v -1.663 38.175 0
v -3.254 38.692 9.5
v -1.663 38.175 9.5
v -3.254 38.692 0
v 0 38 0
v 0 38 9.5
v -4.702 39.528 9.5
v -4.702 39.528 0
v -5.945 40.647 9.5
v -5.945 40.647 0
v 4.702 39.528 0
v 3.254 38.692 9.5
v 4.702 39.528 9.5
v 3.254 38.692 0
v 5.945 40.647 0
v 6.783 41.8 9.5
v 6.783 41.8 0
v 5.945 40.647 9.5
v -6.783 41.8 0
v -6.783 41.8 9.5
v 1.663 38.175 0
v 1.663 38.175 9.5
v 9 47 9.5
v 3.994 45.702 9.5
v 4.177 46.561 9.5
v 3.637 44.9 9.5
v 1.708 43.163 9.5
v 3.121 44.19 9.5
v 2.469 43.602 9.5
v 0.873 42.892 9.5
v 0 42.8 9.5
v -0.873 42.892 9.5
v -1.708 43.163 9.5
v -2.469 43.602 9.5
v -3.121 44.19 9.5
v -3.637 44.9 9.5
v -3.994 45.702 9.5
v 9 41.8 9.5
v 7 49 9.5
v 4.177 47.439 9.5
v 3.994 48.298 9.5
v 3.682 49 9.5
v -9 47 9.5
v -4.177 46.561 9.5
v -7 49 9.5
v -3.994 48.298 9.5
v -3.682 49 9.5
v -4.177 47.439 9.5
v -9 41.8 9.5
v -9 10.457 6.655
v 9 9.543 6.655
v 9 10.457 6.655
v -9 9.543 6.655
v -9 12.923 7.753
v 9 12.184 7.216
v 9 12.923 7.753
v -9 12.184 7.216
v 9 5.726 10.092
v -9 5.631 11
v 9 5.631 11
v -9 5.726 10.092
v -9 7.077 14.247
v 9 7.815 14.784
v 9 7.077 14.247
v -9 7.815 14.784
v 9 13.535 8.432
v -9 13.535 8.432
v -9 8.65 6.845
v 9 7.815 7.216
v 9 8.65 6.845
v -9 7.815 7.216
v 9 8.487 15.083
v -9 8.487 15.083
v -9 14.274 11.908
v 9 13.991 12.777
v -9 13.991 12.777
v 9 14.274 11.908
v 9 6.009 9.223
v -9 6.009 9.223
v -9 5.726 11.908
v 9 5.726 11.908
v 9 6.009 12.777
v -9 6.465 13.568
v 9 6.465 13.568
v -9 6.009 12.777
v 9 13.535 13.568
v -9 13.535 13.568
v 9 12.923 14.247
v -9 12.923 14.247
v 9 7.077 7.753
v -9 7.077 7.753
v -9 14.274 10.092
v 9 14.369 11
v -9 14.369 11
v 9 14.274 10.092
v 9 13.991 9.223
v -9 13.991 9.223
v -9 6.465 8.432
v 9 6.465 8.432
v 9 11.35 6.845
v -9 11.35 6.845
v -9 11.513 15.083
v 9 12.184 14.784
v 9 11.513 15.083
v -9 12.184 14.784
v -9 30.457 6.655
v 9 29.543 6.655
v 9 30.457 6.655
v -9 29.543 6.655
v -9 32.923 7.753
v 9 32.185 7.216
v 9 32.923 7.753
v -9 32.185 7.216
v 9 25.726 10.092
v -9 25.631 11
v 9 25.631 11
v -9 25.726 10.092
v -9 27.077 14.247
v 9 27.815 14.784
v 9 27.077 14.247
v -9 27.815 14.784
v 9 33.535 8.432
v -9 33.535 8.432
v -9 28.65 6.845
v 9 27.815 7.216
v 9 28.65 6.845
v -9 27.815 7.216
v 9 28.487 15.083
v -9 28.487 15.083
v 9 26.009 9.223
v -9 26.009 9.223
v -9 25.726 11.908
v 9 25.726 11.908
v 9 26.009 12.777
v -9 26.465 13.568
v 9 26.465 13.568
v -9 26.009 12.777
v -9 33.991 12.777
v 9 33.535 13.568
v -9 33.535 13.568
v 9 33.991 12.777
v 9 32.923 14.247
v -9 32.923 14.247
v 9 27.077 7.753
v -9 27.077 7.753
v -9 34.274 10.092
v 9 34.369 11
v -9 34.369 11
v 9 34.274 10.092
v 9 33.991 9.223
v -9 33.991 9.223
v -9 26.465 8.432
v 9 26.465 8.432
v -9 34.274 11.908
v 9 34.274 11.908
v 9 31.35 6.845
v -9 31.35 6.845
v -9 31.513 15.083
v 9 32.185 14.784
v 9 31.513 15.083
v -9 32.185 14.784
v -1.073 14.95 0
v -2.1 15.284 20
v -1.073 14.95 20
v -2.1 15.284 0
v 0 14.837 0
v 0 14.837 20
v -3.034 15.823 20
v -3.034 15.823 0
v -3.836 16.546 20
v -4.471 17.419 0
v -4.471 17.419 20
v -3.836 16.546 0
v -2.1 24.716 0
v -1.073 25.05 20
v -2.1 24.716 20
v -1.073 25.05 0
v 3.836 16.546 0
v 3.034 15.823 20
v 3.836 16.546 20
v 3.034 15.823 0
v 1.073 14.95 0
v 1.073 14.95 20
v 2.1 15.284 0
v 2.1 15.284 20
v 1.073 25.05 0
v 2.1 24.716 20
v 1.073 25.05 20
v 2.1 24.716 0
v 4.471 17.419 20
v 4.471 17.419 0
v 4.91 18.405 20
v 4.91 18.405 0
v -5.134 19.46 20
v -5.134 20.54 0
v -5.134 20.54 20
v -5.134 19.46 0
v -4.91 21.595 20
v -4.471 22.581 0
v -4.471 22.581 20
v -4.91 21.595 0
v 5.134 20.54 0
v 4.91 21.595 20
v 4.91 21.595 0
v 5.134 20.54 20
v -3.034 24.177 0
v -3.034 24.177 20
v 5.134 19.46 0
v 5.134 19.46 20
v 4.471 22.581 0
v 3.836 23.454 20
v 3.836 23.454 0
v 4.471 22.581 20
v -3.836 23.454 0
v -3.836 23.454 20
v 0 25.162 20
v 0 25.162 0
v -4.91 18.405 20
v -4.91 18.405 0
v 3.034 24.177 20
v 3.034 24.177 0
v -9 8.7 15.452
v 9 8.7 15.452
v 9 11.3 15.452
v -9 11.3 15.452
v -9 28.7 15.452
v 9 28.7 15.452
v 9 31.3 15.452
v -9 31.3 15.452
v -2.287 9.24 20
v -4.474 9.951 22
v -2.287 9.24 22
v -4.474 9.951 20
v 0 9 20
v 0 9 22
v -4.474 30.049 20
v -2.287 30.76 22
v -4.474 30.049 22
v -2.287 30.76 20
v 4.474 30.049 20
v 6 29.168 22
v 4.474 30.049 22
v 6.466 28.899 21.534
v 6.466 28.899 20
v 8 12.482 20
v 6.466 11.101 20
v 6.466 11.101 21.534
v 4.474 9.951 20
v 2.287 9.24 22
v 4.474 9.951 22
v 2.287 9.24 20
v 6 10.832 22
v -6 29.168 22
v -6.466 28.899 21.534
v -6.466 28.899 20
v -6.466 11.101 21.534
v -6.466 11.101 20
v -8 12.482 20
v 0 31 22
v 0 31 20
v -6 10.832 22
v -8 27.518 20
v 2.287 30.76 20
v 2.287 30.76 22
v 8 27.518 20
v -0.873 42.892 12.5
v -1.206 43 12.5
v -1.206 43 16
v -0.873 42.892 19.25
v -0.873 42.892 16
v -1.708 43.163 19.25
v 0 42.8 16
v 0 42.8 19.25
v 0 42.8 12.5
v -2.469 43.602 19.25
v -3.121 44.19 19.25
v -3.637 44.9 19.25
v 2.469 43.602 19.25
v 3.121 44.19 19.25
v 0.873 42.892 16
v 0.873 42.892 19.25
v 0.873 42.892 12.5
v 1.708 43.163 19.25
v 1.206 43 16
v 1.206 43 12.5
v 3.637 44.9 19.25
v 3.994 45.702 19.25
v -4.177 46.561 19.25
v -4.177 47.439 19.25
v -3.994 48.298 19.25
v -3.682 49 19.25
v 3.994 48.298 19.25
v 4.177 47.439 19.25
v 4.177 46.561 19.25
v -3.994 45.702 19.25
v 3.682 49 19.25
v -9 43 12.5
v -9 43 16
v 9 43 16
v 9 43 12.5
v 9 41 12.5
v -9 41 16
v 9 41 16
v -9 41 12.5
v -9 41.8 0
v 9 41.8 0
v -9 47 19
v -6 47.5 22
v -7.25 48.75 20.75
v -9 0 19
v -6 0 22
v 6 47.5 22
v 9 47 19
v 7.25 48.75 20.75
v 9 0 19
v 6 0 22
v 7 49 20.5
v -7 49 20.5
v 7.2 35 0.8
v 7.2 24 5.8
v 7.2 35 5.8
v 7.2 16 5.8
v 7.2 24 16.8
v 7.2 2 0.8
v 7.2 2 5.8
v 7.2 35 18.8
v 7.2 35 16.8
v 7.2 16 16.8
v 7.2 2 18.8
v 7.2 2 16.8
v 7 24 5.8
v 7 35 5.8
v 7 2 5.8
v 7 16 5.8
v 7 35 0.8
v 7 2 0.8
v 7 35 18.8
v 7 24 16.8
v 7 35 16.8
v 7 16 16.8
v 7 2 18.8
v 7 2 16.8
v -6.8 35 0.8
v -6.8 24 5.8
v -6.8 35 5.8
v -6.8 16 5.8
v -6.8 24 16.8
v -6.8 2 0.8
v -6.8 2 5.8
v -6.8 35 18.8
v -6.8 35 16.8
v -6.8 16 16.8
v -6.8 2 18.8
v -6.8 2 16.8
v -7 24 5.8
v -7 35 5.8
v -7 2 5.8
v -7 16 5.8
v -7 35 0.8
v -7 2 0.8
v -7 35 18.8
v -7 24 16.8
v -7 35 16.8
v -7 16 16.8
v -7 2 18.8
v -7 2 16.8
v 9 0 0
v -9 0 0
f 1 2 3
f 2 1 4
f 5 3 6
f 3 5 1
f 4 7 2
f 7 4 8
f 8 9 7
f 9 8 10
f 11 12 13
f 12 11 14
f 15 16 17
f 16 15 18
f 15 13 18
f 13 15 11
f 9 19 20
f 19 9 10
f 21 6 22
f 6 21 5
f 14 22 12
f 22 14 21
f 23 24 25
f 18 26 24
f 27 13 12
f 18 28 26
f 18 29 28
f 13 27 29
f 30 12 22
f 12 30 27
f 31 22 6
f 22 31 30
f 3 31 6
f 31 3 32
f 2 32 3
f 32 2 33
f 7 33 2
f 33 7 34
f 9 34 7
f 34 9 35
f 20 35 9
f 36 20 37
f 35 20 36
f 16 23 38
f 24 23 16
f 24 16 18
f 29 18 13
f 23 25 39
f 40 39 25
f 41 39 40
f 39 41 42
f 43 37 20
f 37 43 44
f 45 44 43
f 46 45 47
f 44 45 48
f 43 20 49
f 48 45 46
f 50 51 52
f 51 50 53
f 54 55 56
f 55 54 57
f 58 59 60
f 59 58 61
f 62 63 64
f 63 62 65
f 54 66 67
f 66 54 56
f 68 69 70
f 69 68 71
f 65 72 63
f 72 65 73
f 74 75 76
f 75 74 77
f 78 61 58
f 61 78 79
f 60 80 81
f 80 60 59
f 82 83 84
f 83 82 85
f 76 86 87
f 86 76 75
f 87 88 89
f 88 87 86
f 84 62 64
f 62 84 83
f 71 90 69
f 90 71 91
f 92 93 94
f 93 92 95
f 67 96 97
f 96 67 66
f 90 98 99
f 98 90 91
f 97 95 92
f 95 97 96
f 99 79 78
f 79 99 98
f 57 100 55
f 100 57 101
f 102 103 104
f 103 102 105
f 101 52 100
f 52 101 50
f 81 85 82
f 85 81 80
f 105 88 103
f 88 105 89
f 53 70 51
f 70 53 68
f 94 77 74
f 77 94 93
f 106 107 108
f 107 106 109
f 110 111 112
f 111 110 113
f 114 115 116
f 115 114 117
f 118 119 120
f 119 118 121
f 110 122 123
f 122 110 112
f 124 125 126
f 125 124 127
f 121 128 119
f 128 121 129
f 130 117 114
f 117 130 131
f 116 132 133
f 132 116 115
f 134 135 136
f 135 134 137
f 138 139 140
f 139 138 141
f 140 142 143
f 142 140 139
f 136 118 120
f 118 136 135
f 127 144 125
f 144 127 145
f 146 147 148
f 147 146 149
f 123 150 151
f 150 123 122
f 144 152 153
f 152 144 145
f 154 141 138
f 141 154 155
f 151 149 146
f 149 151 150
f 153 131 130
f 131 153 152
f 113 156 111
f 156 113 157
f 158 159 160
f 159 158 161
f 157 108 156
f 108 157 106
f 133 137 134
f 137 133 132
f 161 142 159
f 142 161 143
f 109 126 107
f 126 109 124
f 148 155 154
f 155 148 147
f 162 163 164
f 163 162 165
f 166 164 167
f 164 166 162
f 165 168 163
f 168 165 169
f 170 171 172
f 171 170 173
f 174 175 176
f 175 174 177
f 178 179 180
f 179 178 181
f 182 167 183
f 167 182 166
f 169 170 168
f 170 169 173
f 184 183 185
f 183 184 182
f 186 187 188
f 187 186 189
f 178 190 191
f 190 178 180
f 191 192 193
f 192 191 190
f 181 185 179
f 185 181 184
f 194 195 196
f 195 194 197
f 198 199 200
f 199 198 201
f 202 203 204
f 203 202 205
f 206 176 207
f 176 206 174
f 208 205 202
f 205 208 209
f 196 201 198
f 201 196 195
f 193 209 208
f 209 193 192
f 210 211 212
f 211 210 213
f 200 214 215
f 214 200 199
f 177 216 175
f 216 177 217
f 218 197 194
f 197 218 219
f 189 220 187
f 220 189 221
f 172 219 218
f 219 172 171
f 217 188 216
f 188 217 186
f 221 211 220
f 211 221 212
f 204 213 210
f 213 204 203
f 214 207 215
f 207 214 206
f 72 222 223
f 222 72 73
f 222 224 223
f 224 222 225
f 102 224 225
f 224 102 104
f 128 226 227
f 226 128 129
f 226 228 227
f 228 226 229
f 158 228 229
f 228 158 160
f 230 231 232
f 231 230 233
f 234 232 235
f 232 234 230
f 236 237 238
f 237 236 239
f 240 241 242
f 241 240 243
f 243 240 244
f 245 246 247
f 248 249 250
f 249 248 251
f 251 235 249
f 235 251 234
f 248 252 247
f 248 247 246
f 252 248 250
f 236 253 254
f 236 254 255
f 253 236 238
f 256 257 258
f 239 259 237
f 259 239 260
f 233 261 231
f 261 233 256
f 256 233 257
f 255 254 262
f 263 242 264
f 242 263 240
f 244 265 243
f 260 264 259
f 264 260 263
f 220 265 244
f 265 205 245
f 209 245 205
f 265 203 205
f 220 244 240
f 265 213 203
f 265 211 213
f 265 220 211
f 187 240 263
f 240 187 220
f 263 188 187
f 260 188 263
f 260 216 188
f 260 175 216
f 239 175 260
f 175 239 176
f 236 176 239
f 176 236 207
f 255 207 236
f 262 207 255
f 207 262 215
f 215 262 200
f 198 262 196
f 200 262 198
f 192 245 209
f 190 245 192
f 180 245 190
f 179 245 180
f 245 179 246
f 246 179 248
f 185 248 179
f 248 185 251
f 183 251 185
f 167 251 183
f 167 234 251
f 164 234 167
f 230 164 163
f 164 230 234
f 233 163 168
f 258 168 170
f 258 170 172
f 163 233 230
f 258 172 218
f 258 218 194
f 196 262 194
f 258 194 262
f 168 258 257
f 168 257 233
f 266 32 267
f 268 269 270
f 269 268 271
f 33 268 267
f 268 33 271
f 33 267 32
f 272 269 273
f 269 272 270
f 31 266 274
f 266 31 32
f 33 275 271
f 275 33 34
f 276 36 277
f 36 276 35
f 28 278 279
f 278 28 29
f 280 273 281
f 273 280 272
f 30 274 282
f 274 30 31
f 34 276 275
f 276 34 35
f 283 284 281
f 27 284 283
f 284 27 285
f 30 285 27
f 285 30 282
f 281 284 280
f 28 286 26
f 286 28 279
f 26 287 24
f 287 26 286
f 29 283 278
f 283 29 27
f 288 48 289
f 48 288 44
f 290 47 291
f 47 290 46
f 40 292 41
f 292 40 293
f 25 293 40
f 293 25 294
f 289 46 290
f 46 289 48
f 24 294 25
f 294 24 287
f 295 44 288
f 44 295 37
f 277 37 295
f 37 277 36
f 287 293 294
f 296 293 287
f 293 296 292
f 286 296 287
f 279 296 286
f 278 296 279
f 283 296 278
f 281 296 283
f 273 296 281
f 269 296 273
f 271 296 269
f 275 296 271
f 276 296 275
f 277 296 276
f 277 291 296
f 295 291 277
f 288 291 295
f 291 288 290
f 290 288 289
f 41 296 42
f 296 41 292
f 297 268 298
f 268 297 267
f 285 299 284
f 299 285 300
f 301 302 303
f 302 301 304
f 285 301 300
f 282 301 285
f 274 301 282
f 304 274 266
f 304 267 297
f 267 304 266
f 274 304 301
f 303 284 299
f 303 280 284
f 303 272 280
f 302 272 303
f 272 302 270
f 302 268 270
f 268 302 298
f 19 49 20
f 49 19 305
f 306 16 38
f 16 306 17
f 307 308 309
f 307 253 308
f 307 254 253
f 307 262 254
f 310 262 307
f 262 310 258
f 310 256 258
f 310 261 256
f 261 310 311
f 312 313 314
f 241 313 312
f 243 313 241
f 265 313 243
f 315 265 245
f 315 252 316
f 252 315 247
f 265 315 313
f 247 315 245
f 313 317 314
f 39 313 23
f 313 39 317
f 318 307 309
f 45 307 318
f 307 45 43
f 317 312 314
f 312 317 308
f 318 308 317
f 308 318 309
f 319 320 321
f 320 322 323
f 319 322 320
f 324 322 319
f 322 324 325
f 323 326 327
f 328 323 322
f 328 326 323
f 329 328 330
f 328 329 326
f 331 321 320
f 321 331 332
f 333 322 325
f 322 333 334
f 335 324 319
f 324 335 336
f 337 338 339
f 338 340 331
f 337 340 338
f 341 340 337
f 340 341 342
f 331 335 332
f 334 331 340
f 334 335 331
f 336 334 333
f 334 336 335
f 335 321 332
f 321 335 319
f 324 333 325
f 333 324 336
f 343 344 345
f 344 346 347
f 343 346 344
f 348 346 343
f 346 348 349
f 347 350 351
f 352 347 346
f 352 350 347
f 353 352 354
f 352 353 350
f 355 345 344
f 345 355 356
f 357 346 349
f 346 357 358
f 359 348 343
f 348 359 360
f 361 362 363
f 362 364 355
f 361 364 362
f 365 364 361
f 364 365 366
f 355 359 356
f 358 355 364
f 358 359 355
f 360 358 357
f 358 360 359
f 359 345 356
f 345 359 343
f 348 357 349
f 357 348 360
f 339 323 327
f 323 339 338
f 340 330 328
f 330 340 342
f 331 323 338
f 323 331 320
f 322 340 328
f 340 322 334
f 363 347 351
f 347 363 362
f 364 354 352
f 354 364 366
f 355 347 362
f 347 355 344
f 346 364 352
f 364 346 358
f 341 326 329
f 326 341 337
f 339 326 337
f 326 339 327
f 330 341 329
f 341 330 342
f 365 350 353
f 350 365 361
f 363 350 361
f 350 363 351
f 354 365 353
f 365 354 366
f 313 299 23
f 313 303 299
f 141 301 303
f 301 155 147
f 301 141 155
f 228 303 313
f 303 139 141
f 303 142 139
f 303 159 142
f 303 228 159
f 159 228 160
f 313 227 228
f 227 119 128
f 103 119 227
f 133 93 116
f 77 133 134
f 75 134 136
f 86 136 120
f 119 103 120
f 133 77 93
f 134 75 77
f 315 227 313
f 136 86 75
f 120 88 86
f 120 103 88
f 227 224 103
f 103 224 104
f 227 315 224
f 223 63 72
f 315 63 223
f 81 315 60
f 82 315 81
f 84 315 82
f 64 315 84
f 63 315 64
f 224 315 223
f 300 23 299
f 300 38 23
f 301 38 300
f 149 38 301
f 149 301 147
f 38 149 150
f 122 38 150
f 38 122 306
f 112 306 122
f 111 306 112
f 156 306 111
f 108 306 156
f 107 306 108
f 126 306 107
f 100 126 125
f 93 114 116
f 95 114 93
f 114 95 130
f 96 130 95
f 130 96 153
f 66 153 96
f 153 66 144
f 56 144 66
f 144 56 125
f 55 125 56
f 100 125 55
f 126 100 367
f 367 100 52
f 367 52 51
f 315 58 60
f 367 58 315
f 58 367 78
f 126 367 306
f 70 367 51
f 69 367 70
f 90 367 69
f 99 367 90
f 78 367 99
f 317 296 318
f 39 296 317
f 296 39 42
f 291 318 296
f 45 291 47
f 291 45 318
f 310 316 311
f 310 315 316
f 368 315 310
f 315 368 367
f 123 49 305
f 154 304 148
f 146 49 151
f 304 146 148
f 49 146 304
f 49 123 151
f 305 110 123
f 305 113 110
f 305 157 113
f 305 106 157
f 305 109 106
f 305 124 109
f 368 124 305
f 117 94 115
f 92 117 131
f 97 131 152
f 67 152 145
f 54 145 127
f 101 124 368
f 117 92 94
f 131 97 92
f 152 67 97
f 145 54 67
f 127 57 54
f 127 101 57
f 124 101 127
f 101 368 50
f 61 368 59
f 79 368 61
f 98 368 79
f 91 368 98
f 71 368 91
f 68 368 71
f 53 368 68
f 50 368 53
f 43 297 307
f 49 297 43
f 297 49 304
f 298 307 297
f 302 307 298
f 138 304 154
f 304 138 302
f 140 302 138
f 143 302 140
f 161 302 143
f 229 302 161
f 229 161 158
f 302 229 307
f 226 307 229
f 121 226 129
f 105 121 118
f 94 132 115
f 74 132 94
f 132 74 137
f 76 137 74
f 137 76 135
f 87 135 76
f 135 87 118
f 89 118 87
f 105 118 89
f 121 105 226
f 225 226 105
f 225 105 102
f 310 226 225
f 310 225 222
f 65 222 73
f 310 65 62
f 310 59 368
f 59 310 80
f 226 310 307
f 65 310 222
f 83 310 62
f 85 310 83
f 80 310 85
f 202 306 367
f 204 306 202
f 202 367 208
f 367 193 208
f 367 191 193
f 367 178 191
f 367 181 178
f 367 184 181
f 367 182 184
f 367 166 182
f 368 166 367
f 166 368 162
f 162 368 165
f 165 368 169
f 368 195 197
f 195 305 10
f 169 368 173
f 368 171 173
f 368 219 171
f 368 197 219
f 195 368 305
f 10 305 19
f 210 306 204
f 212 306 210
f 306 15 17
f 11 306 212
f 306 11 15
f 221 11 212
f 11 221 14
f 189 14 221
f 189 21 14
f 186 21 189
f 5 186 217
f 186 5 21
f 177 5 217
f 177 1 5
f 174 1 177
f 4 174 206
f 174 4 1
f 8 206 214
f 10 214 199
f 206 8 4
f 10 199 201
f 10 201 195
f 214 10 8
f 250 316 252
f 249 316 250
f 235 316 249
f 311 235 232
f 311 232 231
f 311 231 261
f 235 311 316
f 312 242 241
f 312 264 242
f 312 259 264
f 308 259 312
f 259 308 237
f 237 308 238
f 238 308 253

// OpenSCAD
// PRUSA iteration3
// Y frame corners
// GNU GPL v3
// Josef Průša <iam@josefprusa.cz> and contributors
// http://www.reprap.org/wiki/Prusa_Mendel
// http://prusamendel.org


module corner_base(){	
 translate([-9,-11,0])cube([18,22,49]);
 
}

module corner_holes(){
 translate([-11,-11,0]){
  // Bottom hole
  translate([0,11,10]) rotate([0,90,0]) translate([0,0,-5]) cylinder(h = 270, r=4.369, $fn=30);
  // Top hole
  translate([0,11,30]) rotate([0,90,0]) translate([0,0,-5]) cylinder(h = 270, r=4.369, $fn=30);
  // Middle hole
  translate([11,0,20]) rotate([0,0,90]) rotate([0,90,0]) translate([0,0,-5]) cylinder(h = 270, r=5.1625, $fn=30);
  // Bottom hole bridge
  translate([0,8.8,10]) rotate([0,90,0]) translate([0,0,-5]) cylinder(h = 270, r=2.6, $fn=6);
  // Top hole bridge
  translate([0,8.8,30]) rotate([0,90,0]) translate([0,0,-5]) cylinder(h = 270, r=2.6, $fn=6);

  // Washer hole
  translate([11,-3,20]) rotate([0,0,90]) rotate([0,90,0]) translate([0,0,-5]) cylinder(h = 10, r=11, $fn=30);

  // Top smooth rod insert
  // Smooth rod place
  translate([11,2.75,47]) rotate([0,90,90]) cylinder(h = 10, r=4.2, $fn=30); 
  // Ziptie
  translate([-5,6,41])  cube([30,3.5,2]);
  
  // LM8UU keepout
  difference(){
    translate([11,12.5,46]) rotate([0,90,90]) cylinder(h = 270, r=8, $fn=30);
    translate([21,12.5,62]) rotate([0,90,90]) cube([20,20,30]);
  } 
  
  translate([21,12.5,57]) rotate([0,90,90]) cube([15.2,20,20]);
 
 }
 
}

module corner_fancy(){
 // Side corner cutouts
  translate([-8,-9,0]) rotate([0,0,-45-180]) translate([-15,0,-1]) cube([30,30,51]);
  translate([8,-9,0]) rotate([0,0,45-180]) translate([-15,0,-1]) cube([30,30,51]);
 // Top corner cutouts
    translate([7,0,49]) rotate([0,45,0]) translate([-15,-15,0]) cube([30,30,30]);
    translate([-7,0,49]) rotate([0,-45,0]) translate([-15,-15,0]) cube([30,30,30]);
    rotate([0,0,90]){
    translate([-9.5,0,49]) rotate([0,-45,0]) translate([-15,-15,0]) cube([30,30,30]);
    }
}

module selective_infill(){
    
    translate([7,2,0.8])cube([0.2,33,5]); 
    translate([-7,2,0.8])cube([0.2,33,5]);
    
    translate([ 7,16,5.8])cube([0.2,8,11]);
    translate([-7,16,5.8])cube([0.2,8,11]);
    
    translate([7,2,16.8])cube([0.2,33,2]); 
    translate([-7,2,16.8])cube([0.2,33,2]);
}
    
    
// Final part
module corner(){
 // Rotate the part for better printing
    translate([0,0,11]) rotate([-90,0,0]) 
    {
    difference(){
        corner_base();
        corner_holes();
        corner_fancy();
        translate([0,11,0]) rotate([90,0,0])selective_infill();
        
    }
    }

}

corner();
